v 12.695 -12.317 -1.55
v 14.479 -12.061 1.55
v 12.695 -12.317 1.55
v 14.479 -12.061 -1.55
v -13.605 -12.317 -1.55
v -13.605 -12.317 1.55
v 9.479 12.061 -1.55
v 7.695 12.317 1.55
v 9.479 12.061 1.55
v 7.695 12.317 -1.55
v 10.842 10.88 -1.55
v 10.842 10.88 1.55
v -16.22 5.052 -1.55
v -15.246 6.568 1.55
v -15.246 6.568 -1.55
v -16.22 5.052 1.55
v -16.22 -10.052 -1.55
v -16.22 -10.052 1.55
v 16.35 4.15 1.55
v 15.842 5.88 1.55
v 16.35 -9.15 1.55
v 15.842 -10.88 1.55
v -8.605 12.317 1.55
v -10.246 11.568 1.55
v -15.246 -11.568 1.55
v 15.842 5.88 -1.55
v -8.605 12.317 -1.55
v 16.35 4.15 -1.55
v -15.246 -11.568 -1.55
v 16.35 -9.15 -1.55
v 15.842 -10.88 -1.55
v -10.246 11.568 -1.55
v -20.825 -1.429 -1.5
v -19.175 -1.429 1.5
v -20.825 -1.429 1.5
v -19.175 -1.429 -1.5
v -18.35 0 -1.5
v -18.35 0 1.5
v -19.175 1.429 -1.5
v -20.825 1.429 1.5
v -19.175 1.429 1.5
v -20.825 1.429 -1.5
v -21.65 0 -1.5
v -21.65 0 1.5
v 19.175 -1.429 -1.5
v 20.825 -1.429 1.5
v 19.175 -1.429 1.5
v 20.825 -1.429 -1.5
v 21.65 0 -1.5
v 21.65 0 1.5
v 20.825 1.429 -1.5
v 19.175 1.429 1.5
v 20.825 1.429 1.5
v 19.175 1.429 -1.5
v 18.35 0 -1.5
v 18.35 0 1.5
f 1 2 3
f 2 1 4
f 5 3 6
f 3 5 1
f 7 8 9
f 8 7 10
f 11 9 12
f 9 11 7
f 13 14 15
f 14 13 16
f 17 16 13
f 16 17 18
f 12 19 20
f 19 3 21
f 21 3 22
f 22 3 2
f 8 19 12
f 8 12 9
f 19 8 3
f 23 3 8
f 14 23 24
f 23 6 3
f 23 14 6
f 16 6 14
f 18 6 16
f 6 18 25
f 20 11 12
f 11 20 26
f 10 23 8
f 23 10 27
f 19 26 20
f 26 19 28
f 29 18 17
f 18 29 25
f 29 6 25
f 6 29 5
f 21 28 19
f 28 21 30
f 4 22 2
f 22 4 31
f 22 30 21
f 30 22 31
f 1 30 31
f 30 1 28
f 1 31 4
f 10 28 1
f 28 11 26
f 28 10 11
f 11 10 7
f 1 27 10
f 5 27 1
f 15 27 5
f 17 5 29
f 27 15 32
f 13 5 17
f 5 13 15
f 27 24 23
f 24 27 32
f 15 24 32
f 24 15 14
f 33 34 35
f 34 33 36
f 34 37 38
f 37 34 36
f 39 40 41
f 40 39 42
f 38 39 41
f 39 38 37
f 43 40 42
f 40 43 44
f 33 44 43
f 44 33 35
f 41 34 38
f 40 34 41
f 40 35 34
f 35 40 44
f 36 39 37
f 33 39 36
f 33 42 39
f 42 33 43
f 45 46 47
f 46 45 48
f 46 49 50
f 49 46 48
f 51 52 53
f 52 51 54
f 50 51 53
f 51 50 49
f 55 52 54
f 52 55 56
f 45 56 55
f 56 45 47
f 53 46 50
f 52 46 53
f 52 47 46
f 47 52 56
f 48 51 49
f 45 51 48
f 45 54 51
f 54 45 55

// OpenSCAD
// file: ../../lib/connector/connector_euro.scad
//connector_GSD4(3,0.1);
//connector_Schurter_6100_4(3,0.1);

module connector_Schurter_6100_4(depth,clear)
{
    conn_height = 20;
    conn_width = 27.5;
    conn_radius = 3;
    conn_corner = 4.5;
    lock_width = 12;
    lock_height = conn_height+8;
    lock_depth = 1;

    connector_euro(conn_height,conn_width,depth,conn_radius,conn_corner,clear);
    translate([0, 0, lock_depth-depth/2])
        connector_euro_lock(lock_width,lock_height,depth-lock_depth,clear);
}

module connector_GSD4(depth,clear)
{
    conn_height = 24.5;
    conn_width = 32.5;
    conn_radius = 3;
    conn_corner = 5;
    hole_width = 40;
    hole_diameter = 3.0+clear;
    conn_hole_distance = (hole_width-conn_width)/2;

    connector_euro(conn_height,conn_width,depth,conn_radius,conn_corner,clear);
    translate([-conn_width/2-conn_hole_distance,0,0])
        connector_euro_hole(hole_diameter,depth,clear);
    translate([conn_width/2+conn_hole_distance,0,0])
        connector_euro_hole(hole_diameter,depth,clear);
}

module connector_euro_hole(diameter,depth,clear)
{
    radius = diameter/2 + clear;

    cylinder(r=radius, h=depth,center=true);
}

module connector_euro_lock(width,height,depth,clear)
{
    height = height+2*clear;
    width = width+2*clear;
    depth = depth+clear;

    cube([width, height, depth],center=true);
}

module connector_euro(height,width,depth,radius,corner,clear)
{
    height = height+2*clear;
    width = width+2*clear;
    radius = radius+2*clear;
    depth = depth+clear;
    height_axis = height/2;
    width_axis = width/2;

    hull(){
        translate([radius-width_axis, radius-height_axis, 0])
            cylinder(r=radius, h=depth,center=true);
        translate([width_axis-radius, radius-height_axis, 0])
            cylinder(r=radius, h=depth,center=true);
        translate([radius-width_axis, height_axis-radius-corner, 0])
            cylinder(r=radius, h=depth,center=true);
        translate([radius+corner-width_axis, height_axis-radius, 0])
            cylinder(r=radius, h=depth,center=true);
        translate([width_axis-radius, height_axis-radius-corner, 0])
            cylinder(r=radius, h=depth,center=true);
        translate([width_axis-radius-corner, height_axis-radius, 0])
            cylinder(r=radius, h=depth,center=true);
    }
}
// main file
include <../../lib/connector/connector_euro.scad>;

connector_GSD4(3,0.1);
